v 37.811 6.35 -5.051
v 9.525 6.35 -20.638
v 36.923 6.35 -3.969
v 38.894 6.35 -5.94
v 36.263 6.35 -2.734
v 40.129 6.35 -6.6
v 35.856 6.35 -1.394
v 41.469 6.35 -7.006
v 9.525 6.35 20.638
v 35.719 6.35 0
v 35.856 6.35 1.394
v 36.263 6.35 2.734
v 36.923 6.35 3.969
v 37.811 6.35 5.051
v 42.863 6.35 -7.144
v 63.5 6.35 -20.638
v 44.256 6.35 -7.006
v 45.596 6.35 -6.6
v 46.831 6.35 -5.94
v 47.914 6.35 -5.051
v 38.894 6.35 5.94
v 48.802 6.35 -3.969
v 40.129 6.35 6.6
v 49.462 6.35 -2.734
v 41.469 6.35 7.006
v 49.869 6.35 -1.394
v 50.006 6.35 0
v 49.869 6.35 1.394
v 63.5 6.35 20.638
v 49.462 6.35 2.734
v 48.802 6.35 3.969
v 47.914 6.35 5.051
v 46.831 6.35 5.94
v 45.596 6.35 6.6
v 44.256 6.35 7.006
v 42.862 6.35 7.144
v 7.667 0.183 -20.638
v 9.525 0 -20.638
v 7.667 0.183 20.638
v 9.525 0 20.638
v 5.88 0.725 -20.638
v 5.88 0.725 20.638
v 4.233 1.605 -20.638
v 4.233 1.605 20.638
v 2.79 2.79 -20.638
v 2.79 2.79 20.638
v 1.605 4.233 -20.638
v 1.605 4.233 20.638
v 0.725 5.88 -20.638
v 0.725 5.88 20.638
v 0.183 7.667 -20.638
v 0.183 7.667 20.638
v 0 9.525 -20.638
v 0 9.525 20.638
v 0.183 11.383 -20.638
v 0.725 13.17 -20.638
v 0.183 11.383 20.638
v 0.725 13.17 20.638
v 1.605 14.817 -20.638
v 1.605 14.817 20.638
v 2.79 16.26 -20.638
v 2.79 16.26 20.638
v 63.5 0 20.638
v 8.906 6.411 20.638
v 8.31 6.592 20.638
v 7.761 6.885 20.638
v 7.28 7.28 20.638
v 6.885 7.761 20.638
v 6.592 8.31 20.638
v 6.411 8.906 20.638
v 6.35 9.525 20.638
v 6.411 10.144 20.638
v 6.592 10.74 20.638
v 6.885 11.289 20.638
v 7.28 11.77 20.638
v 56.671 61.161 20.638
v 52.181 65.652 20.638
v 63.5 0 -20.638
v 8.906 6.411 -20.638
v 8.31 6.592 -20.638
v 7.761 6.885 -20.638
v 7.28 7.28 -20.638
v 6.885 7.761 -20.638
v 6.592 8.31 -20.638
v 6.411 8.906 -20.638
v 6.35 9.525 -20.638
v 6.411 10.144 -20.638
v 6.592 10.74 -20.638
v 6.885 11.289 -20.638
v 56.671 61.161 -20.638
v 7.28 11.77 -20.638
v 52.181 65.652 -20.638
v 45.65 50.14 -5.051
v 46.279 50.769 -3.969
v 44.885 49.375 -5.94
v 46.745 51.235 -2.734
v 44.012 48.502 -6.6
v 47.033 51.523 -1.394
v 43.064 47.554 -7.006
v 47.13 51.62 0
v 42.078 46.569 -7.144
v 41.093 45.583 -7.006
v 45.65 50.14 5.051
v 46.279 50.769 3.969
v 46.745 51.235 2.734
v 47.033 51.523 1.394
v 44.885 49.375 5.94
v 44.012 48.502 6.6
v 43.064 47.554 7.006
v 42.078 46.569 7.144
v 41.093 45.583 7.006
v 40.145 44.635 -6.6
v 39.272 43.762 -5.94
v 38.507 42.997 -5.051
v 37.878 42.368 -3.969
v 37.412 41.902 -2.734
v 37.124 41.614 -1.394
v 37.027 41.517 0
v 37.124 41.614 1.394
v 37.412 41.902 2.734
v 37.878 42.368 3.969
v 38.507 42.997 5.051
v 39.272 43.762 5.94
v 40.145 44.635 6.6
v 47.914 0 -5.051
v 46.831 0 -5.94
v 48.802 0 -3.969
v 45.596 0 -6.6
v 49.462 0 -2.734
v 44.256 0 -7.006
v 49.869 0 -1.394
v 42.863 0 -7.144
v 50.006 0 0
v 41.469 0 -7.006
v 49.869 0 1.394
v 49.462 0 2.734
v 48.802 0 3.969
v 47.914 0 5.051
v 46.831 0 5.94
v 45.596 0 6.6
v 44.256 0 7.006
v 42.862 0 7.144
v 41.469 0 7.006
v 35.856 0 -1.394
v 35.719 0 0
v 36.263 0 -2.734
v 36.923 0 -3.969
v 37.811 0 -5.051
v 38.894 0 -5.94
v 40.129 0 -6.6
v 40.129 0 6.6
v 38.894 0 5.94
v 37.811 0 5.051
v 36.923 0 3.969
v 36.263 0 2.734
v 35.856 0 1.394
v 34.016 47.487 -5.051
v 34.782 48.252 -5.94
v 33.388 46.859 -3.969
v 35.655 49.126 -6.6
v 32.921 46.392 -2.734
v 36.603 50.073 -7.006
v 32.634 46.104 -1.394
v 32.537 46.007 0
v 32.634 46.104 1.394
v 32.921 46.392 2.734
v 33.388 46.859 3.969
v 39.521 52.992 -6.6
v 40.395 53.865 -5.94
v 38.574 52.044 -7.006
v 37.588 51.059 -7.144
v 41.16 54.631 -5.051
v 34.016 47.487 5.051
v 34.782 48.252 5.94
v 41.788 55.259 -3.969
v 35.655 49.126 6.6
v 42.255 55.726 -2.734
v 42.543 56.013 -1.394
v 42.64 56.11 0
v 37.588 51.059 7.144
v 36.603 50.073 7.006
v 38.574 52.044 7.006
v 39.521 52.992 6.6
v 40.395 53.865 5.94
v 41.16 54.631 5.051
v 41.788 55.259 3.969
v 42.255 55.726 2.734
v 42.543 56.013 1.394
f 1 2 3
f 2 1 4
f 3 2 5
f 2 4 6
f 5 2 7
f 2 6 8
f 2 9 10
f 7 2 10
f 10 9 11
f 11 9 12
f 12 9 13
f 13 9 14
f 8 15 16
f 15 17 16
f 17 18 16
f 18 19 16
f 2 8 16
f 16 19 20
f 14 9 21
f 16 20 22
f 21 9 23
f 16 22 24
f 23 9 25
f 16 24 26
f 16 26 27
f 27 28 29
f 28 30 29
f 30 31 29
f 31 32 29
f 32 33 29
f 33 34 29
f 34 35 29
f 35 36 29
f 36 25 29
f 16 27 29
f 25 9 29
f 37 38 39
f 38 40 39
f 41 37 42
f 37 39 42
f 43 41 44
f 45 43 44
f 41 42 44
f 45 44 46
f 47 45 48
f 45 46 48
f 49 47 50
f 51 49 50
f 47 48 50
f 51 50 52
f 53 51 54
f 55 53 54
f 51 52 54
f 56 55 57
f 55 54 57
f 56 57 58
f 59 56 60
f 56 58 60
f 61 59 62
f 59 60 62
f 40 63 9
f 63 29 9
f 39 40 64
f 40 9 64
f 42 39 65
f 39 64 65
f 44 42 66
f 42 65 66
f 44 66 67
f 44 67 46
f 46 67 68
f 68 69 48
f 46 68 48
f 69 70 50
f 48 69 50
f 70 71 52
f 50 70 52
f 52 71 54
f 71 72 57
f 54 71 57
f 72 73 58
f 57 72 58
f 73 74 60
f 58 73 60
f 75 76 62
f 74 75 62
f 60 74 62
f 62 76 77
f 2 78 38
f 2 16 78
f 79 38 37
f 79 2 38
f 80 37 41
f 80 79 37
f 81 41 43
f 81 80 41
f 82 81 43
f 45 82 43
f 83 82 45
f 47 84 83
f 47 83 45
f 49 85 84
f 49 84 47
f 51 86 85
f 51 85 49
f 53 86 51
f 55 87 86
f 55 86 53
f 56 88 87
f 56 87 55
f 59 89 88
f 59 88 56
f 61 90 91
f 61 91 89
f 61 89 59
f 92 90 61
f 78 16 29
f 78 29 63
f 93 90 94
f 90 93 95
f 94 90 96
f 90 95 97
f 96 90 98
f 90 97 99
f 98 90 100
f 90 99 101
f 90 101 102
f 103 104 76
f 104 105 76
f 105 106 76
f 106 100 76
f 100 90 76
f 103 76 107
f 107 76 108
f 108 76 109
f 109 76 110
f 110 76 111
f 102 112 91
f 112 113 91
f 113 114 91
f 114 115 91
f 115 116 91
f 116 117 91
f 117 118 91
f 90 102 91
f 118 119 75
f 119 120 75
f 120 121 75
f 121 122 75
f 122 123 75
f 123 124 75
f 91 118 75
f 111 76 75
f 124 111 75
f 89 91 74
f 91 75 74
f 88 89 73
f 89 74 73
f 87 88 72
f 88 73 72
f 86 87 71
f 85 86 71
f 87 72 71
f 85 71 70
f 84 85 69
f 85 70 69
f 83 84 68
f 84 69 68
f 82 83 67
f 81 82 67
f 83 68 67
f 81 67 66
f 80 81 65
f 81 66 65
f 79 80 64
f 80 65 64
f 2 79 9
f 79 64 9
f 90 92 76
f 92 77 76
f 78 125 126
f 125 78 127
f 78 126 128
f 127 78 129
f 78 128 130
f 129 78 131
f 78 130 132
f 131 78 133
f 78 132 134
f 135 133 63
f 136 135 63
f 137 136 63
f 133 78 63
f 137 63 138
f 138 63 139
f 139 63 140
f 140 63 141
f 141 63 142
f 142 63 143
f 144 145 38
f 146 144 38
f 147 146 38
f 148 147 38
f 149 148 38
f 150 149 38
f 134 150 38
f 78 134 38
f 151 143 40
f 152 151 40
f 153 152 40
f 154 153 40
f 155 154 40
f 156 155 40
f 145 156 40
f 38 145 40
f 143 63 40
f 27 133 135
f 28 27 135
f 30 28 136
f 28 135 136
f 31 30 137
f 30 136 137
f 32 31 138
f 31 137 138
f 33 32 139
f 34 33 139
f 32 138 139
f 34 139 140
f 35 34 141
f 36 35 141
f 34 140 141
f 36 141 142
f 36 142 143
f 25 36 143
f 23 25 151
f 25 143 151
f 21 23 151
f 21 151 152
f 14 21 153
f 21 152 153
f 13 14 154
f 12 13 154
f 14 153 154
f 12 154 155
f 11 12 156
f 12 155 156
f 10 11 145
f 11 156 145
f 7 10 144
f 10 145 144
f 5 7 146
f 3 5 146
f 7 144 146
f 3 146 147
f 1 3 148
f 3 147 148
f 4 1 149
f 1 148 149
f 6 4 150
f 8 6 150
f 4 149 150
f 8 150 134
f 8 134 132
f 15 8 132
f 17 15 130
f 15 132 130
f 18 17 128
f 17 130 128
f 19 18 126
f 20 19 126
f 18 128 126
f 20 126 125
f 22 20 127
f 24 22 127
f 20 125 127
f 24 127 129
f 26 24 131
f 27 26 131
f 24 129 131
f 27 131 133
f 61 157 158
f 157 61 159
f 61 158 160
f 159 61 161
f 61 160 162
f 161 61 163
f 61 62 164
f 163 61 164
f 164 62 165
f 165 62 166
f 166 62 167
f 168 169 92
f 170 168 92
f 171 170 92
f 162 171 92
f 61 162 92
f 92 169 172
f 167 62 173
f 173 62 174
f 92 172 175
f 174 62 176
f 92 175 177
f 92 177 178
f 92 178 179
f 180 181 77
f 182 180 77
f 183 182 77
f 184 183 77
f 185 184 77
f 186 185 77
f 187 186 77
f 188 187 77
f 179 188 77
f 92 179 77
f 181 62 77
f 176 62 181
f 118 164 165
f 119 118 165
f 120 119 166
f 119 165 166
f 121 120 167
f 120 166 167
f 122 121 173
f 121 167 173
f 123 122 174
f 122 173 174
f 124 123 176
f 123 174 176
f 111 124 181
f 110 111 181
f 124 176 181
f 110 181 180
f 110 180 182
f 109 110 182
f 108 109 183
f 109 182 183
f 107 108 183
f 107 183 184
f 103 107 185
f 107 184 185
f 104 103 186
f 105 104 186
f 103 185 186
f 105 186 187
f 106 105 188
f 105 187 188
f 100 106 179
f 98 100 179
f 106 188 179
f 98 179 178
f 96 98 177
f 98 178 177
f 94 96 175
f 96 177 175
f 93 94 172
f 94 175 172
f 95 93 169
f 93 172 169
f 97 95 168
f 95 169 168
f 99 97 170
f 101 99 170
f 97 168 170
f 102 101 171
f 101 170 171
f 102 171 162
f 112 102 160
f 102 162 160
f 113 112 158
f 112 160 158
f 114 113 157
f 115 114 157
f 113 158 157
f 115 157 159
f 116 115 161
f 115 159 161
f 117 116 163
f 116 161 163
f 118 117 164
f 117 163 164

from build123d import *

# Parameters (mm, degrees)
EXTRUDE_THIN1_DEPTH = 20.6375
SKETCH2_R           = 7.14375
CUT_EXTRUDE1_DEPTH  = 6.35
SKETCH3_R           = 7.14375
CUT_EXTRUDE2_DEPTH  = 6.35


with BuildPart() as part:
    # Sketch1 → Extrude-Thin1 (new, symmetric)
    with BuildSketch(Plane.XY):
        with BuildLine():
            Line((63.5, 0), (9.525, 0))
            ThreePointArc((9.525, 0), (0.725047453, 5.879940307), (2.789807909, 16.260192091))
            Line((2.789807909, 16.260192091), (52.181216575, 65.651600757))
            Line((52.181216575, 65.651600757), (56.671344636, 61.161472696))
            Line((56.671344636, 61.161472696), (7.27993597, 11.77006403))
            ThreePointArc((7.27993597, 11.77006403), (6.591682484, 8.309980102), (9.525, 6.35))
            Line((9.525, 6.35), (63.5, 6.35))
            Line((63.5, 6.35), (63.5, 0))
        make_face()
    extrude(amount=EXTRUDE_THIN1_DEPTH, both=True)

    # Sketch2 → Cut-Extrude1 (cut)
    with BuildSketch(Plane.XZ):
        with Locations((42.8625, 0)):
            Circle(SKETCH2_R)
    extrude(amount=-CUT_EXTRUDE1_DEPTH, mode=Mode.SUBTRACT)

    # Sketch3 → Cut-Extrude2 (cut)
    with BuildSketch(Plane(origin=(-6.735192091, 6.735192091, 0), x_dir=(0, 0, 1), z_dir=(-0.7071067811865439, 0.7071067811865511, 0))):
        with Locations(Location((0, 62.682884182, 0), (0, 0, 270))):
            Circle(SKETCH3_R)
    extrude(amount=-CUT_EXTRUDE2_DEPTH, mode=Mode.SUBTRACT)


solid = part.part
